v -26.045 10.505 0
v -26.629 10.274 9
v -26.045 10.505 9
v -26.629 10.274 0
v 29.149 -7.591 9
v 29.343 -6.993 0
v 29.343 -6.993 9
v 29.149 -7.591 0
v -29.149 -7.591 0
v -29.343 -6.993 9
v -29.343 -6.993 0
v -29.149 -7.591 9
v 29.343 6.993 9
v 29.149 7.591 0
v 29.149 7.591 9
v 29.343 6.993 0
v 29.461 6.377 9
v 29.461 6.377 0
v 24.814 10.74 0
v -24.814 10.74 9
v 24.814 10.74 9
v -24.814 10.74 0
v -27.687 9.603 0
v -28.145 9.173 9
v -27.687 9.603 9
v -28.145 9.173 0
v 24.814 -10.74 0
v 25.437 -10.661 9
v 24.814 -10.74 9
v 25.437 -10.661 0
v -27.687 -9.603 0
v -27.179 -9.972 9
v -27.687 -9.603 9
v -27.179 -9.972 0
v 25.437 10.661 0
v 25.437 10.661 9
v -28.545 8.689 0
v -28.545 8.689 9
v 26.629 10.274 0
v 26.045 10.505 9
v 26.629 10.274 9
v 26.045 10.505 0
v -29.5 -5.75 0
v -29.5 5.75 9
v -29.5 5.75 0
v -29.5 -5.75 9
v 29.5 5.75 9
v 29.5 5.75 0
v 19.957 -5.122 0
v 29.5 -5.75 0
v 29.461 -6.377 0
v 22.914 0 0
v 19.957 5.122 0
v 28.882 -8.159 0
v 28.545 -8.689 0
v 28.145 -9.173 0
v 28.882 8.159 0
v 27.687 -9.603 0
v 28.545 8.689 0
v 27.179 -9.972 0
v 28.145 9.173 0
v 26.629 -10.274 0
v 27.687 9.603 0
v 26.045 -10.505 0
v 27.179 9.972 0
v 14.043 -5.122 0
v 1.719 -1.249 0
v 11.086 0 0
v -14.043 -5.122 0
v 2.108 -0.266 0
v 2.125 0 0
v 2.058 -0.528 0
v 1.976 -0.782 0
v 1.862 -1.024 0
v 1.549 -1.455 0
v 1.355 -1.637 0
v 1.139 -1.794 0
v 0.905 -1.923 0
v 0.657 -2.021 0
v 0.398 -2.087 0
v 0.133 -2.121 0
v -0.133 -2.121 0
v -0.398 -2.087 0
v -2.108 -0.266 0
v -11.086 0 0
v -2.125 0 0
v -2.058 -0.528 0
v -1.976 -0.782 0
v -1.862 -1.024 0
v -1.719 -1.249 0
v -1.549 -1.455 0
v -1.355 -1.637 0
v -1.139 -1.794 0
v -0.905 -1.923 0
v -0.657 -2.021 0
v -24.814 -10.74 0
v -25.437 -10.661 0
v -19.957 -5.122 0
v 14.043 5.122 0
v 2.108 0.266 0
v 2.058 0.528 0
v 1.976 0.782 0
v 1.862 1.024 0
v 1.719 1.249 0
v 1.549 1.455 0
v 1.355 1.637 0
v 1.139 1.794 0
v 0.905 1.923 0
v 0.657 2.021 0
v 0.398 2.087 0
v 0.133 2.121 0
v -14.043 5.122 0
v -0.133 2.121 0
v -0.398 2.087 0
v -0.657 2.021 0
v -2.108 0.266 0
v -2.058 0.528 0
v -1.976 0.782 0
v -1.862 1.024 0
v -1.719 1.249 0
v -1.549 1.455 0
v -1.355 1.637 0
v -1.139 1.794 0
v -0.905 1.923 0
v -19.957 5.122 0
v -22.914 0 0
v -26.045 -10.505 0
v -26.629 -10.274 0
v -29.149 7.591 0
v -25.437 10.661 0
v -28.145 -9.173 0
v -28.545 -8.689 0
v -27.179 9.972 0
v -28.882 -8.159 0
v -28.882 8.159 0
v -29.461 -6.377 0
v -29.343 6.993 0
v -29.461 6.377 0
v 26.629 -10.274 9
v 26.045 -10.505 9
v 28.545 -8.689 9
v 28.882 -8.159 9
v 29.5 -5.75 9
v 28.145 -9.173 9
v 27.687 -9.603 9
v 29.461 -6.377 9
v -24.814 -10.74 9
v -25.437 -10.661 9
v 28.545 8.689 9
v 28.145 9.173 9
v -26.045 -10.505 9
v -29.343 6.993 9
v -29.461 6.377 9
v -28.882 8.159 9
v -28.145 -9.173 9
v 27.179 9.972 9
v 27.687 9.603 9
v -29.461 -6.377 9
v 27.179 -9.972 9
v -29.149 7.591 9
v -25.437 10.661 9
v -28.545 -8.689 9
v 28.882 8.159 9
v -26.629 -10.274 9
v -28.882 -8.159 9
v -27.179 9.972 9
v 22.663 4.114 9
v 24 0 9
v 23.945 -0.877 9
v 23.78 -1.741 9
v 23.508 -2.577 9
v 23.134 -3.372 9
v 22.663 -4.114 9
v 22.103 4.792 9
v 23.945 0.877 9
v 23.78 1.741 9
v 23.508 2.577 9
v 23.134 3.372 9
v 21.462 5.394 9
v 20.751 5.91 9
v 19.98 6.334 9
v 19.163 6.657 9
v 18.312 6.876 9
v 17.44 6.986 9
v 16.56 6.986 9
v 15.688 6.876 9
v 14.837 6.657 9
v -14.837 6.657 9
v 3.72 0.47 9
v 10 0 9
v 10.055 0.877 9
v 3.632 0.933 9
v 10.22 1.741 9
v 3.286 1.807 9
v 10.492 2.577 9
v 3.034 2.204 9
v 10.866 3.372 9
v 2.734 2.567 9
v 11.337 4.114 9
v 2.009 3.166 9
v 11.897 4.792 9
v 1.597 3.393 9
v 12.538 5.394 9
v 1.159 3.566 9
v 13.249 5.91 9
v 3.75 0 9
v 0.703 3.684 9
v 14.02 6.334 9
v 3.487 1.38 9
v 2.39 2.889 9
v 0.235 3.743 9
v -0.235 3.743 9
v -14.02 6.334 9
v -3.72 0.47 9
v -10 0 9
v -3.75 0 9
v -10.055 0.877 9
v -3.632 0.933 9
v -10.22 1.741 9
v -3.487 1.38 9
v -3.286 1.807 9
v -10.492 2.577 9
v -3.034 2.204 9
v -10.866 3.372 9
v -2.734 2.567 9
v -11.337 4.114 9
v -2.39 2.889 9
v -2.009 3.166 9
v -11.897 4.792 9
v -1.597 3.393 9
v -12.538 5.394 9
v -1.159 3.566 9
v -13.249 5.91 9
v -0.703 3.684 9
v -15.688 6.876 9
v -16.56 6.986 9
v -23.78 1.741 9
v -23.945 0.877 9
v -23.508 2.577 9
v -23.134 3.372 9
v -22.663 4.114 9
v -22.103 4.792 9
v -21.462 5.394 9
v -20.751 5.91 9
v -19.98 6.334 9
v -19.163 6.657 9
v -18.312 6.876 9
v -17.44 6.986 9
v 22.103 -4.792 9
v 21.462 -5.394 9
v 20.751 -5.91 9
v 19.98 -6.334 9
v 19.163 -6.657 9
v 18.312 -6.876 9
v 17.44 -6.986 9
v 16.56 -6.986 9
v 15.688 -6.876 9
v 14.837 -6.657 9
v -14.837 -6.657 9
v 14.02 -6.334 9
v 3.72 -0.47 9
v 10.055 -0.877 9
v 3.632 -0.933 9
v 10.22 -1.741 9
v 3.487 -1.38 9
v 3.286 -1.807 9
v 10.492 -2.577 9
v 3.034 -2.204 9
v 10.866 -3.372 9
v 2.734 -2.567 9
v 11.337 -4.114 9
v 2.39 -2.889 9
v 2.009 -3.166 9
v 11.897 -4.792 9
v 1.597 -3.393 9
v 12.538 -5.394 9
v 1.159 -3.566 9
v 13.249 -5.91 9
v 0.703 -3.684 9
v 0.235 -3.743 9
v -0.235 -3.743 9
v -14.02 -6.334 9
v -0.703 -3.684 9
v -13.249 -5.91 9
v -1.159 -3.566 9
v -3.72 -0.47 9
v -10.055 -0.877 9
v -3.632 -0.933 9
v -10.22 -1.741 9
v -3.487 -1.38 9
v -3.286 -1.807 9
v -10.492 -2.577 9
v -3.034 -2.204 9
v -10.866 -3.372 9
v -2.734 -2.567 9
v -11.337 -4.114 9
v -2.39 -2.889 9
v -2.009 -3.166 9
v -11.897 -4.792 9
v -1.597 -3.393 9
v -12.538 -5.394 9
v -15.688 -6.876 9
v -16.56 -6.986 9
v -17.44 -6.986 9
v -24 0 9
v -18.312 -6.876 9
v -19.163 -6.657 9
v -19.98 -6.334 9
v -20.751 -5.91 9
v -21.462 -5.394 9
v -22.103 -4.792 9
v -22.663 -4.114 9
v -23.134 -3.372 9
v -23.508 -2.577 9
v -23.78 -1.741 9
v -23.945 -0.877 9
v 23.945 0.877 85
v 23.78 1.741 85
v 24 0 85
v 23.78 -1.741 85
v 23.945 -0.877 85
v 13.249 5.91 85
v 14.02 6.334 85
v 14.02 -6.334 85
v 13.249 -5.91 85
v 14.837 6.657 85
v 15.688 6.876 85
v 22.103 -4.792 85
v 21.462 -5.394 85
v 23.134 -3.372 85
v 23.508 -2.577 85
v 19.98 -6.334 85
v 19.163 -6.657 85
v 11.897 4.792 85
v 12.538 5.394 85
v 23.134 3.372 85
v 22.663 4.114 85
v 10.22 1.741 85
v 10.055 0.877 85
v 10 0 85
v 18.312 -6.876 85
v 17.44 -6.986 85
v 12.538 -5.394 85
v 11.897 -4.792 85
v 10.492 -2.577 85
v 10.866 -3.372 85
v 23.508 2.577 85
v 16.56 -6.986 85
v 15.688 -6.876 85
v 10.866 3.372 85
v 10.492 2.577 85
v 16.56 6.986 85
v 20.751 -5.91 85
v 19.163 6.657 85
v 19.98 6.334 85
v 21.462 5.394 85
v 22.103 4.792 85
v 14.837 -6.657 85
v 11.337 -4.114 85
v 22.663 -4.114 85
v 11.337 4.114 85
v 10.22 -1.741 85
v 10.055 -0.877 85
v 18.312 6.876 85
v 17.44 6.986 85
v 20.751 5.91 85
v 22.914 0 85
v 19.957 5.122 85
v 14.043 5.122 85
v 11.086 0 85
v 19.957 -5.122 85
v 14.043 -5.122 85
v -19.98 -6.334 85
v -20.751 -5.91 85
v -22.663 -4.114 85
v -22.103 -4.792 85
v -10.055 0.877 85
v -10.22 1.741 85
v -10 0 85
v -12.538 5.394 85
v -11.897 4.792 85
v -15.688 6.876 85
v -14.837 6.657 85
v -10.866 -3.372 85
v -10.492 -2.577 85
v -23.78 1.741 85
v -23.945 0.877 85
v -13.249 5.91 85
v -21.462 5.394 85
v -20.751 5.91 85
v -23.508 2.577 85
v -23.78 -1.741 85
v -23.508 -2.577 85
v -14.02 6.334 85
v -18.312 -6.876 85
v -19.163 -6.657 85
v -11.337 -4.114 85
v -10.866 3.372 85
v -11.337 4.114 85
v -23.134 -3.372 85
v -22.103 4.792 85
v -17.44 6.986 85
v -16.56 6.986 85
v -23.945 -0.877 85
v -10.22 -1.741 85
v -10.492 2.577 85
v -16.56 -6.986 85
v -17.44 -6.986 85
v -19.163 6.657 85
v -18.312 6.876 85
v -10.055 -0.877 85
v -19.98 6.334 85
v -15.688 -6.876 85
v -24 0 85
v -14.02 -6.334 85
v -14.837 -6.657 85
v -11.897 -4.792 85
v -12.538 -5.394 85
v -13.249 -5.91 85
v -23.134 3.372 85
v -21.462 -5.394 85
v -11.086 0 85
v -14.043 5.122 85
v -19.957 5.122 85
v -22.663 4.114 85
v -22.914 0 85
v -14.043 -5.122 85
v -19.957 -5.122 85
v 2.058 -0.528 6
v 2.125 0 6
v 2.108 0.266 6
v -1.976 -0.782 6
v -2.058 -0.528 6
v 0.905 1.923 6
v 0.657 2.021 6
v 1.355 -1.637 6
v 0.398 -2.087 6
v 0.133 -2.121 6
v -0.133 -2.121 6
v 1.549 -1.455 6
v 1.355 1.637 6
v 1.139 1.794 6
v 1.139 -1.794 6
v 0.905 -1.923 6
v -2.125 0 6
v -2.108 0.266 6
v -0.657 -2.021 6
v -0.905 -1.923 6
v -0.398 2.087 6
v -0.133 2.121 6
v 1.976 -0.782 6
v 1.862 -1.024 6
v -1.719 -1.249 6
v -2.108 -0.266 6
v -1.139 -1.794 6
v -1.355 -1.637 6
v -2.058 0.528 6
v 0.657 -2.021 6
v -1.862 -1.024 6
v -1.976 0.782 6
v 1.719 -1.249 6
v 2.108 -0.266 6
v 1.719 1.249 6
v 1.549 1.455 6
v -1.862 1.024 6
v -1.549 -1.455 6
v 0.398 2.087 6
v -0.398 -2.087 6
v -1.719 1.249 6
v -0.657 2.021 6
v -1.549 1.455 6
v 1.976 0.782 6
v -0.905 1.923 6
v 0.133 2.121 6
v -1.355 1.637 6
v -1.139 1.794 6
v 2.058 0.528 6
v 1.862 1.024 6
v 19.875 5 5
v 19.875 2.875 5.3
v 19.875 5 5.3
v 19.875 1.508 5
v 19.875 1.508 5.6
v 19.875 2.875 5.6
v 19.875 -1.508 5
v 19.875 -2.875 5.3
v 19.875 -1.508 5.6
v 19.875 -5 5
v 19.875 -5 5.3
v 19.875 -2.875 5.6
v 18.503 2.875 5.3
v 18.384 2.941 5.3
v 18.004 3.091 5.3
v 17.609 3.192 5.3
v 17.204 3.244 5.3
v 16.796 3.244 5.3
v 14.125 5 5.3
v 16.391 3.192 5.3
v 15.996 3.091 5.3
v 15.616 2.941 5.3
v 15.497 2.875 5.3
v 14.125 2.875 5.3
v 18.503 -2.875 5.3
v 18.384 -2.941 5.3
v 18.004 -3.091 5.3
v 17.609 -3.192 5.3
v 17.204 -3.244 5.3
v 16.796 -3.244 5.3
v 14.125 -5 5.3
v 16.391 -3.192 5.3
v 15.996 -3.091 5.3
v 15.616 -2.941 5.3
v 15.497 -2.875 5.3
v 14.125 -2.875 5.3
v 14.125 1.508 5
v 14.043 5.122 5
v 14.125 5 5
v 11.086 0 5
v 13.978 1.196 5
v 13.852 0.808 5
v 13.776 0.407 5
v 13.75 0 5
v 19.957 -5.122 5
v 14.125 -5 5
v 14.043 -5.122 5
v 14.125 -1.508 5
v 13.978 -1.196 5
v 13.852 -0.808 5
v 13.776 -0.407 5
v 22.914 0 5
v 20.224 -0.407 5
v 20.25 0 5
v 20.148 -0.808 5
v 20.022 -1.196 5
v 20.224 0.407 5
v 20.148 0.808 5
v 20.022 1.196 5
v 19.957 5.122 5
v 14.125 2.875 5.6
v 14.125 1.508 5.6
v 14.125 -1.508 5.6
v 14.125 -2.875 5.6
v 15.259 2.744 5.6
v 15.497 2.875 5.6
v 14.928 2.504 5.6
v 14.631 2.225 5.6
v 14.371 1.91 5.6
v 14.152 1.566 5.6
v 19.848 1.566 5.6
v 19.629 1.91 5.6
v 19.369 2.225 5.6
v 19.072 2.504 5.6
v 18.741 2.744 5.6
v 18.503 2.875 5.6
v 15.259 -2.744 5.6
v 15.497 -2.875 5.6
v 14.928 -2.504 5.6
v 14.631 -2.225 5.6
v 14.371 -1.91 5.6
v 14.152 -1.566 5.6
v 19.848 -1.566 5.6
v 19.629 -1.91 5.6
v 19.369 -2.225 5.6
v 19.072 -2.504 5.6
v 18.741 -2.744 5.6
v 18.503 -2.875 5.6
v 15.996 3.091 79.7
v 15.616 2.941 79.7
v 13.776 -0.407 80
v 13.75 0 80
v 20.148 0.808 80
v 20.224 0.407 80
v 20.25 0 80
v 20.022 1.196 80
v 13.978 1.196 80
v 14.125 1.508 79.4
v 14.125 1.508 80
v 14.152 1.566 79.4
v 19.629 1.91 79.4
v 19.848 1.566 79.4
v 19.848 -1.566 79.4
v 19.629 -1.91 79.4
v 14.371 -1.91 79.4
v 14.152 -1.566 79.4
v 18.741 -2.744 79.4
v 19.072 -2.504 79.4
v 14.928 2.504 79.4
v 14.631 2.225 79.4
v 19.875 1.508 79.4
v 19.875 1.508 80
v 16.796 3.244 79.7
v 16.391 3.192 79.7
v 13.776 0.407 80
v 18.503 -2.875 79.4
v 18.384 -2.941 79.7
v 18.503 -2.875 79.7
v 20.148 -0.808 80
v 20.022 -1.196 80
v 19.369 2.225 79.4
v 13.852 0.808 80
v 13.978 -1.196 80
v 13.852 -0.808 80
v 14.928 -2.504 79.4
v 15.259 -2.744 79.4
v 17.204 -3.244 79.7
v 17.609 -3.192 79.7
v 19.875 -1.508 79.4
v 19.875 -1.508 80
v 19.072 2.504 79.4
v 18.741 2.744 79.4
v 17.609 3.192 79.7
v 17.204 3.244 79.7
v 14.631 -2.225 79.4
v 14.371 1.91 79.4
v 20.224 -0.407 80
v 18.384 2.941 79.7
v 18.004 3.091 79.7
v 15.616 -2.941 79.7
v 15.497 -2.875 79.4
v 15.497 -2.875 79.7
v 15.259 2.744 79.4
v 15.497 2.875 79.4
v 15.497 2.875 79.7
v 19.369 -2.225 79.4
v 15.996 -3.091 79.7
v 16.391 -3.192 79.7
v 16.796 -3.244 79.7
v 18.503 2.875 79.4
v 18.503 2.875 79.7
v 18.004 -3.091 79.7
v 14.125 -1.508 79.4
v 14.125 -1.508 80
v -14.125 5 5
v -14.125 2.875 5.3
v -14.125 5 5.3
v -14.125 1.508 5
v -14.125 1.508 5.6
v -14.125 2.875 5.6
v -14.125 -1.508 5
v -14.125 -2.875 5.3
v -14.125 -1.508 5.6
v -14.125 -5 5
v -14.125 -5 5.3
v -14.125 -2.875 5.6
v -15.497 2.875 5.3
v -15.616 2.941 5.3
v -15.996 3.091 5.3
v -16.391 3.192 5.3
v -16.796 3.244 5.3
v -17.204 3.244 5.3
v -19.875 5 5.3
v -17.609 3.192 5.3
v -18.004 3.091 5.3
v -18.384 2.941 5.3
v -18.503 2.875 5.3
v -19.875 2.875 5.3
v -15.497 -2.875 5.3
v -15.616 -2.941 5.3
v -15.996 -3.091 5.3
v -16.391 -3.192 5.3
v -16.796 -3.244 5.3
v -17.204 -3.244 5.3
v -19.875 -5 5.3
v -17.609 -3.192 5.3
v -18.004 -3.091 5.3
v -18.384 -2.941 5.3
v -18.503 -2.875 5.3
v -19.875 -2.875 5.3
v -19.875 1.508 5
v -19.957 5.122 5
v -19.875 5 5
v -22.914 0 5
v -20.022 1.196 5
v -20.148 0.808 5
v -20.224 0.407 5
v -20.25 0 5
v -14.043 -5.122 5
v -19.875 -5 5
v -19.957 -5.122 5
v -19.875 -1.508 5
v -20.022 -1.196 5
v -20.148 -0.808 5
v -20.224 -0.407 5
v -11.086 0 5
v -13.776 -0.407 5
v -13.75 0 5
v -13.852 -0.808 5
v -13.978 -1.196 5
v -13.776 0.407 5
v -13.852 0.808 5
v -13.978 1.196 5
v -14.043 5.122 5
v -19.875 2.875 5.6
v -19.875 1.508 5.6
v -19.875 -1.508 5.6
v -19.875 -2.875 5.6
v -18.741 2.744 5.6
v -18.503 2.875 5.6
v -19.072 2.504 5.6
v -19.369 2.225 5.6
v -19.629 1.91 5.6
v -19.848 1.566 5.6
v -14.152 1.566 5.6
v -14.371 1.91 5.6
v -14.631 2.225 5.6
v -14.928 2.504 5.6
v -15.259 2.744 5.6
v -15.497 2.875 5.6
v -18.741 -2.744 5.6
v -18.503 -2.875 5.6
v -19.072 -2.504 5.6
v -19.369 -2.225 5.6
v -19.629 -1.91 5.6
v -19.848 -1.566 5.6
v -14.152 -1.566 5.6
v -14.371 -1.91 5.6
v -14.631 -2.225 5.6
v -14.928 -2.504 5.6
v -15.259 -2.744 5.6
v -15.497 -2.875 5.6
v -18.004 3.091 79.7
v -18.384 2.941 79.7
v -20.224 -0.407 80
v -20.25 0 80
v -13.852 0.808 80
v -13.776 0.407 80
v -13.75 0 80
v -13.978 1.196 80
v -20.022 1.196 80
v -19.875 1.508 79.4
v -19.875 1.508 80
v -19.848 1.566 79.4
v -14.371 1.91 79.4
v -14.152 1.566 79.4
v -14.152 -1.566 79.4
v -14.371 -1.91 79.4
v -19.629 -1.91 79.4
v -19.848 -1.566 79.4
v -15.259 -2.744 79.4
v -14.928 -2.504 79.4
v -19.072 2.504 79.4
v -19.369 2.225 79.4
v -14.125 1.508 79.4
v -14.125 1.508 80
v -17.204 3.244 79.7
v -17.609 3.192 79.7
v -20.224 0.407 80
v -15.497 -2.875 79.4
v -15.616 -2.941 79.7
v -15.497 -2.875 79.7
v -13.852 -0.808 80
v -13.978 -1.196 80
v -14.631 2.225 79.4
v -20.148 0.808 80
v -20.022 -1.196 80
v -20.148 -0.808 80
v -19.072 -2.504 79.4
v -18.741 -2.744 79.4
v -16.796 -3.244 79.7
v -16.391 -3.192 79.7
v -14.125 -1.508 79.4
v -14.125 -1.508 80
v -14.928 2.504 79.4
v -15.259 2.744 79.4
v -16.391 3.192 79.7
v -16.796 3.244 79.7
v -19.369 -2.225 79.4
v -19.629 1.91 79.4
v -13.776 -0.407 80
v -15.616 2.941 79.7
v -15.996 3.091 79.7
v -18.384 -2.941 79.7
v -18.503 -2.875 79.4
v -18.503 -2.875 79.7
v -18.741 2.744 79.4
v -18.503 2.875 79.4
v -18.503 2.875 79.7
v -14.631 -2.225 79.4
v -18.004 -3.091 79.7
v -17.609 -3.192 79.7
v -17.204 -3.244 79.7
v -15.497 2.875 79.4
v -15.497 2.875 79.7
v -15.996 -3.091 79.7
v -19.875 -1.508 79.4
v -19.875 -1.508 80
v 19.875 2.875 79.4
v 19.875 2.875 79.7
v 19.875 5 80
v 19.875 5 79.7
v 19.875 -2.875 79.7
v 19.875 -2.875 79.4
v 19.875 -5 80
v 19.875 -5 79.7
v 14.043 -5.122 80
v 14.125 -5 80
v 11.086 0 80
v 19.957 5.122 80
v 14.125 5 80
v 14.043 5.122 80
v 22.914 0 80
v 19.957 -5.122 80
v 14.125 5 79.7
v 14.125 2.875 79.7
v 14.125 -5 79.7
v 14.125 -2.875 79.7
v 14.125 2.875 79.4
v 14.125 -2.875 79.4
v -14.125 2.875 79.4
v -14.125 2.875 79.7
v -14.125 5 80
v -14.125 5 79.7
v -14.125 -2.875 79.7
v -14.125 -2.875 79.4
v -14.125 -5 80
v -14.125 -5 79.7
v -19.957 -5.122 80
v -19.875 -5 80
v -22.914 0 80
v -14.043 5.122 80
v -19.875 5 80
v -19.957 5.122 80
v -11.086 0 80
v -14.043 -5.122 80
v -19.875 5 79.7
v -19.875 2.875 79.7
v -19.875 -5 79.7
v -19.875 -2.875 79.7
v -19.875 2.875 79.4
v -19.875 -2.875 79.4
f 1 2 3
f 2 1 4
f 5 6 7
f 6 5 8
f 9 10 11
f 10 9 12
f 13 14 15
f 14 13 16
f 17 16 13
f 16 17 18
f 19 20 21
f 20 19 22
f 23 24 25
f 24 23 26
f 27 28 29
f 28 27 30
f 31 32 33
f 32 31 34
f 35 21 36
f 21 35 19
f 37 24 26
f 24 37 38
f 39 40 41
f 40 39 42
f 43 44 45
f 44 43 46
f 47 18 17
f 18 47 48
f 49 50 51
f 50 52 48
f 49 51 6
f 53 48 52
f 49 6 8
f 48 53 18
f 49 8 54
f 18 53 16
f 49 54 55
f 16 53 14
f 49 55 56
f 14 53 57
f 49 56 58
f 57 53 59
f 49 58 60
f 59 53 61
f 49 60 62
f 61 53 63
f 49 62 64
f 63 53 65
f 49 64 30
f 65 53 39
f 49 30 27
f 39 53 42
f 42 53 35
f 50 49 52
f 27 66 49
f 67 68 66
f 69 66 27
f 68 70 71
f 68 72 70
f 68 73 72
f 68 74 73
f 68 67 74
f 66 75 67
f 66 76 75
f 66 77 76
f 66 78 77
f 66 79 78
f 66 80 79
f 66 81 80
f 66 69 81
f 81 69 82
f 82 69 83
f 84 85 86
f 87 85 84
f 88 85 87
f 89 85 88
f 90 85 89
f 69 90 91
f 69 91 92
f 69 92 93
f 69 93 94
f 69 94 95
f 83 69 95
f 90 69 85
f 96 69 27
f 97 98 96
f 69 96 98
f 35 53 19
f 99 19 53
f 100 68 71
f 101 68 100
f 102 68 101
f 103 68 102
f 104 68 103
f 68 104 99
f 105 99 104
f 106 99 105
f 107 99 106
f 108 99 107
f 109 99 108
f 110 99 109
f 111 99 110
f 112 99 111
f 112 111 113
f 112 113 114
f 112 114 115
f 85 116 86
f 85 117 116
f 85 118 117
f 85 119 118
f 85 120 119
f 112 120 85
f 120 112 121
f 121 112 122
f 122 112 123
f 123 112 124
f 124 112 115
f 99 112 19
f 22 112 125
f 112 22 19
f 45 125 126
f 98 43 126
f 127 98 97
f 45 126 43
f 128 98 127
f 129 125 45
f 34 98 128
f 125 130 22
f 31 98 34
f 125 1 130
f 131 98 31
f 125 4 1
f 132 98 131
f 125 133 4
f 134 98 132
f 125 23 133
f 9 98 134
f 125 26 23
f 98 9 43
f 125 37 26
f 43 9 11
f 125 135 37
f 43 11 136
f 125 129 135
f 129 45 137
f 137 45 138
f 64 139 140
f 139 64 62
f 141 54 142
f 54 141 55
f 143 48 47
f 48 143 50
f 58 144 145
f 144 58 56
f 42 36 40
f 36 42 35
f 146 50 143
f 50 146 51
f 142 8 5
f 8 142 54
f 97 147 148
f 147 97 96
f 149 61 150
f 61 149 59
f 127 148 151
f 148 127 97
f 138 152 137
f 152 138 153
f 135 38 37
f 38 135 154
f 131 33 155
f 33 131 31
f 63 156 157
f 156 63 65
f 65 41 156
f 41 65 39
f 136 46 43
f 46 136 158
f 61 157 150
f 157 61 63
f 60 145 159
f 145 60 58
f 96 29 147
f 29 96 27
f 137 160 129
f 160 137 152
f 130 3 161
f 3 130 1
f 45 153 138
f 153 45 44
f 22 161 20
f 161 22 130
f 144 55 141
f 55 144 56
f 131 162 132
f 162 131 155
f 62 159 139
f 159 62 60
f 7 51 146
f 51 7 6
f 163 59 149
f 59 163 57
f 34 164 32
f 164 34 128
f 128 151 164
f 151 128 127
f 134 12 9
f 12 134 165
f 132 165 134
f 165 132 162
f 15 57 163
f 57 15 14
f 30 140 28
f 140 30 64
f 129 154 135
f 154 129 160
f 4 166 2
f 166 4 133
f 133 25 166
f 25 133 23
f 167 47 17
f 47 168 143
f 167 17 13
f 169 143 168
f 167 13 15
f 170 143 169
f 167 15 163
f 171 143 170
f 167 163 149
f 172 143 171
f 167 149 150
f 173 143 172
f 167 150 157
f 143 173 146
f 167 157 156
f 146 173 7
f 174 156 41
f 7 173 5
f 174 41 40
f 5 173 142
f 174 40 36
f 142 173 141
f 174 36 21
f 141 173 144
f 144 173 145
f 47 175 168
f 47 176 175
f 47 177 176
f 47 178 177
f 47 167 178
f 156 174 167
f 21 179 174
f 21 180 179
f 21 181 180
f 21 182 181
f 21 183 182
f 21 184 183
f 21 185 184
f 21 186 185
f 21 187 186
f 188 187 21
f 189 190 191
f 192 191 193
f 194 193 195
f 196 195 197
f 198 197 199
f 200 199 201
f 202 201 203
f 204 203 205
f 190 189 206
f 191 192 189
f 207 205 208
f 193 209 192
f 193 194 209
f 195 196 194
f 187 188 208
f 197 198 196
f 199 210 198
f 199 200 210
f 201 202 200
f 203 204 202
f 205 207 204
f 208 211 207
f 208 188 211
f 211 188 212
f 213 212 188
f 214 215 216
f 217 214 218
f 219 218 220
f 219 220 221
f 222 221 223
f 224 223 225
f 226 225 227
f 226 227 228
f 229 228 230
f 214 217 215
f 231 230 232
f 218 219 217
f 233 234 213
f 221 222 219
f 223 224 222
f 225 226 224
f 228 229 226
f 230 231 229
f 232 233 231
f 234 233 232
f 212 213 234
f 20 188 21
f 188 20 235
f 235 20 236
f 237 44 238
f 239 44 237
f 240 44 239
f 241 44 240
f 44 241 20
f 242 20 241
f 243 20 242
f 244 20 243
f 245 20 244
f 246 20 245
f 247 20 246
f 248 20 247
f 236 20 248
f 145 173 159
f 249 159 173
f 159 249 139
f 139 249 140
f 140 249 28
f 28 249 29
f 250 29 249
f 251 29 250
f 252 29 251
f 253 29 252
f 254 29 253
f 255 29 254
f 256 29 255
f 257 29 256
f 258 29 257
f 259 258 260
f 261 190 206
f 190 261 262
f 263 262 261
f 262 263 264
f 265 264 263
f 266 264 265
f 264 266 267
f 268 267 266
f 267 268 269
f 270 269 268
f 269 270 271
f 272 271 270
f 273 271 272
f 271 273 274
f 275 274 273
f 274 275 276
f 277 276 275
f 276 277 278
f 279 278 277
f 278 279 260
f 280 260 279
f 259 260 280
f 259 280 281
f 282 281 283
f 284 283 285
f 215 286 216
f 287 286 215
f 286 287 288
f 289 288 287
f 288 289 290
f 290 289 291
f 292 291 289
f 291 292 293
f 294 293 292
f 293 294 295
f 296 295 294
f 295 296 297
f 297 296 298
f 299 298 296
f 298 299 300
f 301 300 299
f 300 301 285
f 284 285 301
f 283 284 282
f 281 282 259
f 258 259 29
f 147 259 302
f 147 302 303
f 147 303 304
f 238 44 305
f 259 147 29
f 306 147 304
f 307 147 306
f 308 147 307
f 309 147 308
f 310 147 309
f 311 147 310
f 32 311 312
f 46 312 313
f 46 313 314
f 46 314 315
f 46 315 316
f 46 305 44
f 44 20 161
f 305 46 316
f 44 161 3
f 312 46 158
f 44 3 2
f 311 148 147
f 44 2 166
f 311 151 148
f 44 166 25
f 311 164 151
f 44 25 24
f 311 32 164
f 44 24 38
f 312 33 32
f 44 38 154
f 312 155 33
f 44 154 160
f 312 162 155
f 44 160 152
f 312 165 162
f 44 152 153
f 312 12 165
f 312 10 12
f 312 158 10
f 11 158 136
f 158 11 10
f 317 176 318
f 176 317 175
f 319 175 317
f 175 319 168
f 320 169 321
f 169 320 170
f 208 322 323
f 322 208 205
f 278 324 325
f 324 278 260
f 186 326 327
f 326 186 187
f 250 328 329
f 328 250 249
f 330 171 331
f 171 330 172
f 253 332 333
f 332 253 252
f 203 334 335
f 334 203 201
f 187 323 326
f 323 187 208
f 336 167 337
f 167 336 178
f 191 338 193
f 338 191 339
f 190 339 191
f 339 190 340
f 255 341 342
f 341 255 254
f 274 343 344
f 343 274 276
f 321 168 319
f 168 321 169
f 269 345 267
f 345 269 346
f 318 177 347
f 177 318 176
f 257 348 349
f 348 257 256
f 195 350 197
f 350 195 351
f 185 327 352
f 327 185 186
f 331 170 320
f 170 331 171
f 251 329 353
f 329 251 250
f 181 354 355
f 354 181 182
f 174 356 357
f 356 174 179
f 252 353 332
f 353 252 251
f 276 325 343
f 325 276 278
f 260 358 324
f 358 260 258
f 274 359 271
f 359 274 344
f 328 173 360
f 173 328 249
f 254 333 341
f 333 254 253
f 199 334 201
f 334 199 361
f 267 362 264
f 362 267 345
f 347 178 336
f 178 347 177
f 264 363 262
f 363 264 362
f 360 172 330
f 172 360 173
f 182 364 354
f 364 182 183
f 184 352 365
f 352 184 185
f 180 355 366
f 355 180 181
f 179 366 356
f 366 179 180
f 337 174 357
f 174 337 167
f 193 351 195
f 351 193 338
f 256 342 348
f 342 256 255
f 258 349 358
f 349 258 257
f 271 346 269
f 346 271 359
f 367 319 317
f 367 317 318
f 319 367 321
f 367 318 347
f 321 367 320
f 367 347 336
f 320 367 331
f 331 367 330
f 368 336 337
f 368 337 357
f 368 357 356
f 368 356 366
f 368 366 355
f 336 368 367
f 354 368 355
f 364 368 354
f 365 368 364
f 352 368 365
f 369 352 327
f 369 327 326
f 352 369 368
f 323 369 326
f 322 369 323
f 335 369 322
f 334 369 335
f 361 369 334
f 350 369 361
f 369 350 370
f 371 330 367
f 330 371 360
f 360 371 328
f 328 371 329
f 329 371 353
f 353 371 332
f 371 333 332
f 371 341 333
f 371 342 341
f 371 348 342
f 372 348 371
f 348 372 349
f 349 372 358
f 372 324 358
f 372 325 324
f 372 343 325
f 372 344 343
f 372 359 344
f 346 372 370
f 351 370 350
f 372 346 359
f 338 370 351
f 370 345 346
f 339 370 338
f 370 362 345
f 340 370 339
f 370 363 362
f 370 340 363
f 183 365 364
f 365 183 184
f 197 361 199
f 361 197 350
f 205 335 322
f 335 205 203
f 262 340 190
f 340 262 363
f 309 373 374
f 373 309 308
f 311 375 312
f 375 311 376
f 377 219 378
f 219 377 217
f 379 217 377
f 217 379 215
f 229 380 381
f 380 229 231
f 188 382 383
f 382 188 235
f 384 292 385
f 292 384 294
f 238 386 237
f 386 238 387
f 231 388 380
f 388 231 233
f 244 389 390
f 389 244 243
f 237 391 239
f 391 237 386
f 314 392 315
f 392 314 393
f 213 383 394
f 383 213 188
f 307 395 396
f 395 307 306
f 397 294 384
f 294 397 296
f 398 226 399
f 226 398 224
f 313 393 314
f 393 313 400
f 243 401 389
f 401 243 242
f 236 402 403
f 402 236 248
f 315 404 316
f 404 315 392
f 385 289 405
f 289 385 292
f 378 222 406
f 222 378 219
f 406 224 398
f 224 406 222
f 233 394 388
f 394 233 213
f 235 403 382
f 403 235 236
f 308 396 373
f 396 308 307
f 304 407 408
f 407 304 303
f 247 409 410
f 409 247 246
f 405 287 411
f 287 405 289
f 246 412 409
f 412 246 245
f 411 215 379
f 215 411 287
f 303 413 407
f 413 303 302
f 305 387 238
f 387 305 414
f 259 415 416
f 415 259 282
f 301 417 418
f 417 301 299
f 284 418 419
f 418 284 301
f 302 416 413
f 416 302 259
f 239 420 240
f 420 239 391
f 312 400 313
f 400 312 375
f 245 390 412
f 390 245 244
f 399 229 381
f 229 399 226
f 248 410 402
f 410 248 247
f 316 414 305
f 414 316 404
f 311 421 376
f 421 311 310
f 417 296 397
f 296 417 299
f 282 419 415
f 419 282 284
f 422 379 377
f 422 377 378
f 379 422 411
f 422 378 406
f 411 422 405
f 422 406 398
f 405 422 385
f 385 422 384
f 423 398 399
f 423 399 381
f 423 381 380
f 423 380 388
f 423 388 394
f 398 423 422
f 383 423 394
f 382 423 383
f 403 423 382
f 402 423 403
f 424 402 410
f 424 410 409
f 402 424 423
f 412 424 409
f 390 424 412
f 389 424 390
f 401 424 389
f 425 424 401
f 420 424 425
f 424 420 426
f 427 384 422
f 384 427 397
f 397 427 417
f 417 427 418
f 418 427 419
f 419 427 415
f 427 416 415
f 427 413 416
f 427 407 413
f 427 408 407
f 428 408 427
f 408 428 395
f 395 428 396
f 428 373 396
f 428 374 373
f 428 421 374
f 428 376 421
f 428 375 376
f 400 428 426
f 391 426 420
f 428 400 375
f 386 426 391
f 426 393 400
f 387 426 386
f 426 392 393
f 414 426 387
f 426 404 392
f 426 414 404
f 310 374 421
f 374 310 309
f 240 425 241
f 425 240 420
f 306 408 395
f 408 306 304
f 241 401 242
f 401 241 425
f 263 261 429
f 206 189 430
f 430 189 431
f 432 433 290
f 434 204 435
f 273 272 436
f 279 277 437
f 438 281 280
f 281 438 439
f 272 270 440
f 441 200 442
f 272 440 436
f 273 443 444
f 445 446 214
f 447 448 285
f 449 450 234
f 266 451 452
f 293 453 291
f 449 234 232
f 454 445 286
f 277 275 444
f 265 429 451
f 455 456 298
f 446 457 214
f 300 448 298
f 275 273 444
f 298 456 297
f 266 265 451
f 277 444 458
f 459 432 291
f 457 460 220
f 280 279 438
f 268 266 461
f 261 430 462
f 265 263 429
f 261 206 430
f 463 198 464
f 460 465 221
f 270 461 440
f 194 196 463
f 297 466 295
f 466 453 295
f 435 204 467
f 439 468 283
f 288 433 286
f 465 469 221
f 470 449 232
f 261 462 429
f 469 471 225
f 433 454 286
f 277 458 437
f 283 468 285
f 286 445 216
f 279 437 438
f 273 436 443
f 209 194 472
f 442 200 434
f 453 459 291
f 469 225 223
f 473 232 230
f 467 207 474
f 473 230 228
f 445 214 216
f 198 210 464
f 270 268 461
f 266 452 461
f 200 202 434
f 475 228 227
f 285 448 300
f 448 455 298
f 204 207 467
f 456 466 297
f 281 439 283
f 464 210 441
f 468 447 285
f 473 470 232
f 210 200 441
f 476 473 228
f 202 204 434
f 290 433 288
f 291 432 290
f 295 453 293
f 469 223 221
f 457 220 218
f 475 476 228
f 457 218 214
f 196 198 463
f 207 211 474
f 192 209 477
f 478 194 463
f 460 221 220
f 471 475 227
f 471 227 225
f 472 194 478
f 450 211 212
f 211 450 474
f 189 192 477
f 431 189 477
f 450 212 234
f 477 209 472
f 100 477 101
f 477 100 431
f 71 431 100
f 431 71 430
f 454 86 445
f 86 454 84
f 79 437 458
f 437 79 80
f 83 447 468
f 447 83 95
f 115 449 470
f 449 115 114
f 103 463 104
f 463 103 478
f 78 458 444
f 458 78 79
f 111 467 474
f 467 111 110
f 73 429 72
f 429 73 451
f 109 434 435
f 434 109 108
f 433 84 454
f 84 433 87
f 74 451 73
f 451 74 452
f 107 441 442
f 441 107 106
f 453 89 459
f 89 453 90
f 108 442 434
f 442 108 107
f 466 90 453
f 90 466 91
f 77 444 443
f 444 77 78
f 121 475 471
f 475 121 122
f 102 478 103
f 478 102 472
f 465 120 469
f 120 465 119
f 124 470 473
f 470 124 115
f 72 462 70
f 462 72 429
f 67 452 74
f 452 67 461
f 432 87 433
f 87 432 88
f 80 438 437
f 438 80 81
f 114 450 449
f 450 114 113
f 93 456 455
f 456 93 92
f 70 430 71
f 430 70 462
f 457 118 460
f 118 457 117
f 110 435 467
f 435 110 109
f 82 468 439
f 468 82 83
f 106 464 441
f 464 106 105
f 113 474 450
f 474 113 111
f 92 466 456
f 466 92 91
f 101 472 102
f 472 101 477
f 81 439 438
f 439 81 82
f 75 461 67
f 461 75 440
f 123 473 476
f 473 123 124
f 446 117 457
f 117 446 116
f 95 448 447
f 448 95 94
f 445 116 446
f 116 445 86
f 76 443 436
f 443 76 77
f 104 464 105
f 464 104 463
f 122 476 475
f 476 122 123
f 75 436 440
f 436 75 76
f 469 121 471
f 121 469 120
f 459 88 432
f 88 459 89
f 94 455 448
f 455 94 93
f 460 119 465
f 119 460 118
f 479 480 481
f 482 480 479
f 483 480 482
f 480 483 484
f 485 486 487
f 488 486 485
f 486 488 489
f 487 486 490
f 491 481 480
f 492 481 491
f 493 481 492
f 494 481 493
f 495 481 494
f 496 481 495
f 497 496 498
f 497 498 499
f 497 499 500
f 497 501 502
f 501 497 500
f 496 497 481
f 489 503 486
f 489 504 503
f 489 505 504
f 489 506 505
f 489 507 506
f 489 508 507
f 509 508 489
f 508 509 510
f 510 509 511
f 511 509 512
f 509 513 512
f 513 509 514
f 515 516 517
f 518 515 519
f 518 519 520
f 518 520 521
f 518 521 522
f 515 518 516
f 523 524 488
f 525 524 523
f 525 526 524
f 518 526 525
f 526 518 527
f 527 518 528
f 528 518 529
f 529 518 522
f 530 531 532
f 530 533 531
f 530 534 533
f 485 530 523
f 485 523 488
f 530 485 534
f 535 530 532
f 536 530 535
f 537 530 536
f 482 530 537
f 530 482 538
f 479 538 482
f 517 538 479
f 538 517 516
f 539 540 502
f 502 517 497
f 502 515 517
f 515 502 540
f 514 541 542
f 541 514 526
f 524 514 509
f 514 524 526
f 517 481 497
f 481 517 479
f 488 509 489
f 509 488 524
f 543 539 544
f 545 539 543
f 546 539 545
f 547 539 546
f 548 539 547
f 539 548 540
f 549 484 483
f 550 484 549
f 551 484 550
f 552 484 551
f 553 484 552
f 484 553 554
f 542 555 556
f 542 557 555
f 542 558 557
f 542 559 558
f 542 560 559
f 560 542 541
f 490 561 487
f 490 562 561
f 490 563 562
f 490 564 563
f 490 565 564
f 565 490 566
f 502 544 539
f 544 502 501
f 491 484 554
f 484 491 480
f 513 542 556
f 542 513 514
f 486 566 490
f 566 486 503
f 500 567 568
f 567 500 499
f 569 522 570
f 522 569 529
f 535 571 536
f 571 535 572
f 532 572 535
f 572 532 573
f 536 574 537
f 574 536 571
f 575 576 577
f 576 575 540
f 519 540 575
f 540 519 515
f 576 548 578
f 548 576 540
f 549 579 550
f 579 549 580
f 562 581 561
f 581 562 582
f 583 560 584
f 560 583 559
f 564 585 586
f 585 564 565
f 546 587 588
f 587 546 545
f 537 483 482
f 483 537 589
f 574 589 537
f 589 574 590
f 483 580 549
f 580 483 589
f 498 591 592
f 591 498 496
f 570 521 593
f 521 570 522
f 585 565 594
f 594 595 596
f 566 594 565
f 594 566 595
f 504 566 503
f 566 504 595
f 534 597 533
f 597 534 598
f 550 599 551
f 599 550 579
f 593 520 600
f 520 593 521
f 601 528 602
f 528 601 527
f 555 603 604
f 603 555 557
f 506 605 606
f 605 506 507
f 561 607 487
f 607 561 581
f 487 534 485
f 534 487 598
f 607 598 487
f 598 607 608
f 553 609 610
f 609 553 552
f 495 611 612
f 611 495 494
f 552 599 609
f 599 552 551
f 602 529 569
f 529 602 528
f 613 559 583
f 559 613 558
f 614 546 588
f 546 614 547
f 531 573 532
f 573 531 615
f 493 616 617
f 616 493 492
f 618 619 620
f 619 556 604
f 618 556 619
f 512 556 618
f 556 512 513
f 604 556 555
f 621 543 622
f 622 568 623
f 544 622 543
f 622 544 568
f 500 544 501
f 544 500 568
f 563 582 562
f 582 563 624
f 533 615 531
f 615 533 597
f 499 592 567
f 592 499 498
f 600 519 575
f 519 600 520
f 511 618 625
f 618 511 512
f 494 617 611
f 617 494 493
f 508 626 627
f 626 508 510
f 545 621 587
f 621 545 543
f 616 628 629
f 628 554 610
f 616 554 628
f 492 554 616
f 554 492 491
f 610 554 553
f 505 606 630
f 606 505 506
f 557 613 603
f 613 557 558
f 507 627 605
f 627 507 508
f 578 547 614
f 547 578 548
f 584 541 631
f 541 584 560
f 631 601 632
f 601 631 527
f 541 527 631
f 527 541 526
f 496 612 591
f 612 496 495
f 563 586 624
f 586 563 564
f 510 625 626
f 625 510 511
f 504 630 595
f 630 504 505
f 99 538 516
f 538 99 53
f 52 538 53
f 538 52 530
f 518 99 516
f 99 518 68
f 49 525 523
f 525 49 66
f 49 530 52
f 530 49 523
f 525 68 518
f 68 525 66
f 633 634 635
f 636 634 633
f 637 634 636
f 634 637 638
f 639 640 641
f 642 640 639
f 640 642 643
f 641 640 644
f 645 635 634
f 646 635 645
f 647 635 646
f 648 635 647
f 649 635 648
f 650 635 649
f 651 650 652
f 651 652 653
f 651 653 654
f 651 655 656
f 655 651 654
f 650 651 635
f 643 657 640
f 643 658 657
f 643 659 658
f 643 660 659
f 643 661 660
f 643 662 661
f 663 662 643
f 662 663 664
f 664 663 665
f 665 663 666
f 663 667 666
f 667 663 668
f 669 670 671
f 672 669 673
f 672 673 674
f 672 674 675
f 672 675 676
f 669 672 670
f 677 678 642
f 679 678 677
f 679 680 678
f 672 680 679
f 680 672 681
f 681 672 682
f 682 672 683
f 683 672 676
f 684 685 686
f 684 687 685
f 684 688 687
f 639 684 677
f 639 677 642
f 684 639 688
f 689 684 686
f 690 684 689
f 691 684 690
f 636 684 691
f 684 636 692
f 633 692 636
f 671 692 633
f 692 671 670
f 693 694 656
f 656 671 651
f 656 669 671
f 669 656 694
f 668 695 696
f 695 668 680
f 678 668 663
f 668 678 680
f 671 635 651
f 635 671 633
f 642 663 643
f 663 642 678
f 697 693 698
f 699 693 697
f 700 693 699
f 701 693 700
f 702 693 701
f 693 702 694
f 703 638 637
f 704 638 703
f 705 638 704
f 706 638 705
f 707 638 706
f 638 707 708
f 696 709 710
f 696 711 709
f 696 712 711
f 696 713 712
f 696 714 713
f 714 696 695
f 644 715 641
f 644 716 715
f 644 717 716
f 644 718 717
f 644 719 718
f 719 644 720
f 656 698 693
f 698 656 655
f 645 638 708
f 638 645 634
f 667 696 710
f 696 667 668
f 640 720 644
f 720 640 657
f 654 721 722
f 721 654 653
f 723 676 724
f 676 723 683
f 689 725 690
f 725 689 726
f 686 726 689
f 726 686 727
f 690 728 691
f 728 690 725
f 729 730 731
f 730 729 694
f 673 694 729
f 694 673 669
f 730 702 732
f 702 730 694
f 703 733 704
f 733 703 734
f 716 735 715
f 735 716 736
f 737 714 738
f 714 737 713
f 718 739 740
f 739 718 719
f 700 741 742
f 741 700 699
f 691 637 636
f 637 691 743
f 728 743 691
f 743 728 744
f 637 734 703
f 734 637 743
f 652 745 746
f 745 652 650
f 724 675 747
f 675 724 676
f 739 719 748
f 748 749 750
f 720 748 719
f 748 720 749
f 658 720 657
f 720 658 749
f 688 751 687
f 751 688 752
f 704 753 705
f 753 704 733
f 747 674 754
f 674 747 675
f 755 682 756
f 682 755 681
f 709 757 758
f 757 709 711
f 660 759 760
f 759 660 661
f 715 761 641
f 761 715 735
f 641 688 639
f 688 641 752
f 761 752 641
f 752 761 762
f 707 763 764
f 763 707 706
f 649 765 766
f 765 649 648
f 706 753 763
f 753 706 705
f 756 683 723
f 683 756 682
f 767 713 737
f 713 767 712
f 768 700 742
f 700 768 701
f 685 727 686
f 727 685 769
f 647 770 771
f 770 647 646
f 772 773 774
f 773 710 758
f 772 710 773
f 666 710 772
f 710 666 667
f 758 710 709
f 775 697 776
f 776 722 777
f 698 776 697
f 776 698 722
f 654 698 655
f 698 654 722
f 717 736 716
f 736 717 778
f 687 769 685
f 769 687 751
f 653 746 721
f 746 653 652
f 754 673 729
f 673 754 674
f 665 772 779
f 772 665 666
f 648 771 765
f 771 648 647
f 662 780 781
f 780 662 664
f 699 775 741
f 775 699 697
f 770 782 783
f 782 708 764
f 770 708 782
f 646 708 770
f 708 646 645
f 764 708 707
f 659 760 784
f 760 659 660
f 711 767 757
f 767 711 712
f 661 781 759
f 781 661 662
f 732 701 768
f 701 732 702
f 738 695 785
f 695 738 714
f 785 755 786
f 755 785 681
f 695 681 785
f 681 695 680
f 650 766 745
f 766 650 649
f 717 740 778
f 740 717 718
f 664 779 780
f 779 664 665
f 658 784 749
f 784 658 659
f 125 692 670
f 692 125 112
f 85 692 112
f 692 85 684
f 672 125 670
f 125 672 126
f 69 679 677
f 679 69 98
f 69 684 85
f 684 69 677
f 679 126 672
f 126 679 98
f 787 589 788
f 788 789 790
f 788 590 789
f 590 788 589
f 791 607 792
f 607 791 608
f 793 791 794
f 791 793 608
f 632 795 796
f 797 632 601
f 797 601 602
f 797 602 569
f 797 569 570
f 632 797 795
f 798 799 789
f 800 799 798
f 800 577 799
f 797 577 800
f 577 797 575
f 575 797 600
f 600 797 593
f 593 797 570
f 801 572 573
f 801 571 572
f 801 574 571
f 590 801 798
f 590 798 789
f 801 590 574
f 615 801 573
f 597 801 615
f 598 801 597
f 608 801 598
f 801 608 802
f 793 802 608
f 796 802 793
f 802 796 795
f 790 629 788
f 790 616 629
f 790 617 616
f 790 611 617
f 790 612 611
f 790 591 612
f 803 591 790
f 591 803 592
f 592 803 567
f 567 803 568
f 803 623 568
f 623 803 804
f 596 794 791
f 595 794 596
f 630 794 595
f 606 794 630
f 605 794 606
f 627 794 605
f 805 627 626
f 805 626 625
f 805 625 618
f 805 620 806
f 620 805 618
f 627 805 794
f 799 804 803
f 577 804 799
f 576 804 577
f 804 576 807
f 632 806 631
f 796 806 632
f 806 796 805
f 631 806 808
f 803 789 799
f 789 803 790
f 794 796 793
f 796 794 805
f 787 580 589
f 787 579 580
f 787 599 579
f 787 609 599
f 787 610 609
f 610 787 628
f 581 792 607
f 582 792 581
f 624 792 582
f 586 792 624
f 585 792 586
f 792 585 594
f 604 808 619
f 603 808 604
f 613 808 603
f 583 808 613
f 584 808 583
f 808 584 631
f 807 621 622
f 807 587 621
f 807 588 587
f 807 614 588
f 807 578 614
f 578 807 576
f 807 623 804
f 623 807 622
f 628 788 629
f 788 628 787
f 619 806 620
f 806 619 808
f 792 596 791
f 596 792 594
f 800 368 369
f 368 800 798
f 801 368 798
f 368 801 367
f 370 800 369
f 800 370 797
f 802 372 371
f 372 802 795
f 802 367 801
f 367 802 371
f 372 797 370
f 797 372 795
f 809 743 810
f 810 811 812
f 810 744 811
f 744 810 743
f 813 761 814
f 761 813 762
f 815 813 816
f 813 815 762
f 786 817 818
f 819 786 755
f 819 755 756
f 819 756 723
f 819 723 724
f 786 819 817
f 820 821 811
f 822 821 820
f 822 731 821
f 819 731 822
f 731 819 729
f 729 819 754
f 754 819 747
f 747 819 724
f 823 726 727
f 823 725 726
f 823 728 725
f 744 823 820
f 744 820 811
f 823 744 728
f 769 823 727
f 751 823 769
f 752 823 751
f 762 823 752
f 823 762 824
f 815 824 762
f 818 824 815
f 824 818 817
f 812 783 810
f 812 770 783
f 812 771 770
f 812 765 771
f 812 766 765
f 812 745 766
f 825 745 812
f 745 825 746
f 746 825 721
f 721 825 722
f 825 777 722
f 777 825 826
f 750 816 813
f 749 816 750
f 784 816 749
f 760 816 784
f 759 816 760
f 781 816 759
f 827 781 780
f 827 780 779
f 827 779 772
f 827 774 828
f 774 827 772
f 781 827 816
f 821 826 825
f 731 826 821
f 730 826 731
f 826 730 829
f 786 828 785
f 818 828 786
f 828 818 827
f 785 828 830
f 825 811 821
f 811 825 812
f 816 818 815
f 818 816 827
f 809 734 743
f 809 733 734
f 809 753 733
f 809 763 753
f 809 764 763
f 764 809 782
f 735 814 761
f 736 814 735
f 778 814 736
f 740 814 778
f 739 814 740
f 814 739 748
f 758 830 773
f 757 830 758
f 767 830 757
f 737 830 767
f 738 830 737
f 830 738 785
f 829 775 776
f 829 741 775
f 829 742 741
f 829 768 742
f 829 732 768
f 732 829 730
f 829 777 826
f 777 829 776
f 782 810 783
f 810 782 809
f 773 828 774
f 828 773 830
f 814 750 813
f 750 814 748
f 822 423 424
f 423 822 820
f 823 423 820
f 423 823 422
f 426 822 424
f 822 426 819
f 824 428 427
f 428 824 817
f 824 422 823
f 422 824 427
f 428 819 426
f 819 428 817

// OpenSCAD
$fn = 50;


difference() {
	union() {
		hull() {
			translate(v = [-24.5000000000, 5.7500000000, 0]) {
				cylinder(h = 9, r = 5);
			}
			translate(v = [24.5000000000, 5.7500000000, 0]) {
				cylinder(h = 9, r = 5);
			}
			translate(v = [-24.5000000000, -5.7500000000, 0]) {
				cylinder(h = 9, r = 5);
			}
			translate(v = [24.5000000000, -5.7500000000, 0]) {
				cylinder(h = 9, r = 5);
			}
		}
		translate(v = [17.0000000000, 0, 0.0000000000]) {
			cylinder(h = 85, r = 7.0000000000);
		}
		translate(v = [-17.0000000000, 0, 0.0000000000]) {
			cylinder(h = 85, r = 7.0000000000);
		}
		translate(v = [17.0000000000, 0, 79.0000000000]) {
			cylinder(h = 6, r = 7.0000000000);
		}
		translate(v = [-17.0000000000, 0, 79.0000000000]) {
			cylinder(h = 6, r = 7.0000000000);
		}
	}
	union() {
		translate(v = [0, 0, 9]) {
			rotate(a = [0, 0, 0]) {
				difference() {
					union() {
						#translate(v = [0, 0, -80.0000000000]) {
							cylinder(h = 80, r = 2.0000000000);
						}
						#translate(v = [0, 0, -3]) {
							cylinder(h = 3, r1 = 2.1250000000, r2 = 3.7500000000);
						}
						#translate(v = [0, 0, -80.0000000000]) {
							cylinder(h = 80, r = 2.1250000000);
						}
						#translate(v = [0, 0, -80.0000000000]) {
							cylinder(h = 80, r = 2.0000000000);
						}
					}
					union();
				}
			}
		}
		translate(v = [17.0000000000, 0, 0]) {
			rotate(a = [0, 0, 0]) {
				difference() {
					union() {
						#translate(v = [-2.8750000000, -5.0000000000, -0.3000000000]) {
							cube(size = [5.7500000000, 10, 0.3000000000]);
						}
						#translate(v = [-2.8750000000, -2.8750000000, -0.6000000000]) {
							cube(size = [5.7500000000, 5.7500000000, 0.3000000000]);
						}
						#translate(v = [-2.8750000000, -5.0000000000, 5]) {
							cube(size = [5.7500000000, 10, 0.3000000000]);
						}
						#translate(v = [-2.8750000000, -2.8750000000, 5.3000000000]) {
							cube(size = [5.7500000000, 5.7500000000, 0.3000000000]);
						}
						#translate(v = [0, 0, -100.0000000000]) {
							cylinder(h = 200, r = 3.2500000000);
						}
						#linear_extrude(height = 5) {
							polygon(points = [[5.9142500000, 0.0000000000], [2.9571250000, 5.1218907443], [-2.9571250000, 5.1218907443], [-5.9142500000, 0.0000000000], [-2.9571250000, -5.1218907443], [2.9571250000, -5.1218907443]]);
						}
						#translate(v = [-2.8750000000, -5.0000000000, -0.3000000000]) {
							cube(size = [5.7500000000, 10, 0.3000000000]);
						}
						#translate(v = [-2.8750000000, -2.8750000000, -0.6000000000]) {
							cube(size = [5.7500000000, 5.7500000000, 0.3000000000]);
						}
						#translate(v = [-2.8750000000, -5.0000000000, 5]) {
							cube(size = [5.7500000000, 10, 0.3000000000]);
						}
						#translate(v = [-2.8750000000, -2.8750000000, 5.3000000000]) {
							cube(size = [5.7500000000, 5.7500000000, 0.3000000000]);
						}
						#translate(v = [0, 0, -100.0000000000]) {
							cylinder(h = 200, r = 3.2500000000);
						}
						#translate(v = [-2.8750000000, -5.0000000000, -0.3000000000]) {
							cube(size = [5.7500000000, 10, 0.3000000000]);
						}
						#translate(v = [-2.8750000000, -2.8750000000, -0.6000000000]) {
							cube(size = [5.7500000000, 5.7500000000, 0.3000000000]);
						}
						#translate(v = [-2.8750000000, -5.0000000000, 5]) {
							cube(size = [5.7500000000, 10, 0.3000000000]);
						}
						#translate(v = [-2.8750000000, -2.8750000000, 5.3000000000]) {
							cube(size = [5.7500000000, 5.7500000000, 0.3000000000]);
						}
						#translate(v = [0, 0, -100.0000000000]) {
							cylinder(h = 200, r = 3.2500000000);
						}
					}
					union();
				}
			}
		}
		translate(v = [-17.0000000000, 0, 0]) {
			rotate(a = [0, 0, 0]) {
				difference() {
					union() {
						#translate(v = [-2.8750000000, -5.0000000000, -0.3000000000]) {
							cube(size = [5.7500000000, 10, 0.3000000000]);
						}
						#translate(v = [-2.8750000000, -2.8750000000, -0.6000000000]) {
							cube(size = [5.7500000000, 5.7500000000, 0.3000000000]);
						}
						#translate(v = [-2.8750000000, -5.0000000000, 5]) {
							cube(size = [5.7500000000, 10, 0.3000000000]);
						}
						#translate(v = [-2.8750000000, -2.8750000000, 5.3000000000]) {
							cube(size = [5.7500000000, 5.7500000000, 0.3000000000]);
						}
						#translate(v = [0, 0, -100.0000000000]) {
							cylinder(h = 200, r = 3.2500000000);
						}
						#linear_extrude(height = 5) {
							polygon(points = [[5.9142500000, 0.0000000000], [2.9571250000, 5.1218907443], [-2.9571250000, 5.1218907443], [-5.9142500000, 0.0000000000], [-2.9571250000, -5.1218907443], [2.9571250000, -5.1218907443]]);
						}
						#translate(v = [-2.8750000000, -5.0000000000, -0.3000000000]) {
							cube(size = [5.7500000000, 10, 0.3000000000]);
						}
						#translate(v = [-2.8750000000, -2.8750000000, -0.6000000000]) {
							cube(size = [5.7500000000, 5.7500000000, 0.3000000000]);
						}
						#translate(v = [-2.8750000000, -5.0000000000, 5]) {
							cube(size = [5.7500000000, 10, 0.3000000000]);
						}
						#translate(v = [-2.8750000000, -2.8750000000, 5.3000000000]) {
							cube(size = [5.7500000000, 5.7500000000, 0.3000000000]);
						}
						#translate(v = [0, 0, -100.0000000000]) {
							cylinder(h = 200, r = 3.2500000000);
						}
						#translate(v = [-2.8750000000, -5.0000000000, -0.3000000000]) {
							cube(size = [5.7500000000, 10, 0.3000000000]);
						}
						#translate(v = [-2.8750000000, -2.8750000000, -0.6000000000]) {
							cube(size = [5.7500000000, 5.7500000000, 0.3000000000]);
						}
						#translate(v = [-2.8750000000, -5.0000000000, 5]) {
							cube(size = [5.7500000000, 10, 0.3000000000]);
						}
						#translate(v = [-2.8750000000, -2.8750000000, 5.3000000000]) {
							cube(size = [5.7500000000, 5.7500000000, 0.3000000000]);
						}
						#translate(v = [0, 0, -100.0000000000]) {
							cylinder(h = 200, r = 3.2500000000);
						}
					}
					union();
				}
			}
		}
		translate(v = [17.0000000000, 0, 85]) {
			rotate(a = [0, 0, 0]) {
				difference() {
					union() {
						#translate(v = [-2.8750000000, -5.0000000000, -5.3000000000]) {
							cube(size = [5.7500000000, 10, 0.3000000000]);
						}
						#translate(v = [-2.8750000000, -2.8750000000, -5.6000000000]) {
							cube(size = [5.7500000000, 5.7500000000, 0.3000000000]);
						}
						#translate(v = [-2.8750000000, -5.0000000000, 0]) {
							cube(size = [5.7500000000, 10, 0.3000000000]);
						}
						#translate(v = [-2.8750000000, -2.8750000000, 0.3000000000]) {
							cube(size = [5.7500000000, 5.7500000000, 0.3000000000]);
						}
						#translate(v = [0, 0, -100.0000000000]) {
							cylinder(h = 200, r = 3.2500000000);
						}
						translate(v = [0, 0, -5]) {
							#linear_extrude(height = 5) {
								polygon(points = [[5.9142500000, 0.0000000000], [2.9571250000, 5.1218907443], [-2.9571250000, 5.1218907443], [-5.9142500000, 0.0000000000], [-2.9571250000, -5.1218907443], [2.9571250000, -5.1218907443]]);
							}
						}
						#translate(v = [-2.8750000000, -5.0000000000, -5.3000000000]) {
							cube(size = [5.7500000000, 10, 0.3000000000]);
						}
						#translate(v = [-2.8750000000, -2.8750000000, -5.6000000000]) {
							cube(size = [5.7500000000, 5.7500000000, 0.3000000000]);
						}
						#translate(v = [-2.8750000000, -5.0000000000, 0]) {
							cube(size = [5.7500000000, 10, 0.3000000000]);
						}
						#translate(v = [-2.8750000000, -2.8750000000, 0.3000000000]) {
							cube(size = [5.7500000000, 5.7500000000, 0.3000000000]);
						}
						#translate(v = [0, 0, -100.0000000000]) {
							cylinder(h = 200, r = 3.2500000000);
						}
						#translate(v = [-2.8750000000, -5.0000000000, -5.3000000000]) {
							cube(size = [5.7500000000, 10, 0.3000000000]);
						}
						#translate(v = [-2.8750000000, -2.8750000000, -5.6000000000]) {
							cube(size = [5.7500000000, 5.7500000000, 0.3000000000]);
						}
						#translate(v = [-2.8750000000, -5.0000000000, 0]) {
							cube(size = [5.7500000000, 10, 0.3000000000]);
						}
						#translate(v = [-2.8750000000, -2.8750000000, 0.3000000000]) {
							cube(size = [5.7500000000, 5.7500000000, 0.3000000000]);
						}
						#translate(v = [0, 0, -100.0000000000]) {
							cylinder(h = 200, r = 3.2500000000);
						}
					}
					union();
				}
			}
		}
		translate(v = [-17.0000000000, 0, 85]) {
			rotate(a = [0, 0, 0]) {
				difference() {
					union() {
						#translate(v = [-2.8750000000, -5.0000000000, -5.3000000000]) {
							cube(size = [5.7500000000, 10, 0.3000000000]);
						}
						#translate(v = [-2.8750000000, -2.8750000000, -5.6000000000]) {
							cube(size = [5.7500000000, 5.7500000000, 0.3000000000]);
						}
						#translate(v = [-2.8750000000, -5.0000000000, 0]) {
							cube(size = [5.7500000000, 10, 0.3000000000]);
						}
						#translate(v = [-2.8750000000, -2.8750000000, 0.3000000000]) {
							cube(size = [5.7500000000, 5.7500000000, 0.3000000000]);
						}
						#translate(v = [0, 0, -100.0000000000]) {
							cylinder(h = 200, r = 3.2500000000);
						}
						translate(v = [0, 0, -5]) {
							#linear_extrude(height = 5) {
								polygon(points = [[5.9142500000, 0.0000000000], [2.9571250000, 5.1218907443], [-2.9571250000, 5.1218907443], [-5.9142500000, 0.0000000000], [-2.9571250000, -5.1218907443], [2.9571250000, -5.1218907443]]);
							}
						}
						#translate(v = [-2.8750000000, -5.0000000000, -5.3000000000]) {
							cube(size = [5.7500000000, 10, 0.3000000000]);
						}
						#translate(v = [-2.8750000000, -2.8750000000, -5.6000000000]) {
							cube(size = [5.7500000000, 5.7500000000, 0.3000000000]);
						}
						#translate(v = [-2.8750000000, -5.0000000000, 0]) {
							cube(size = [5.7500000000, 10, 0.3000000000]);
						}
						#translate(v = [-2.8750000000, -2.8750000000, 0.3000000000]) {
							cube(size = [5.7500000000, 5.7500000000, 0.3000000000]);
						}
						#translate(v = [0, 0, -100.0000000000]) {
							cylinder(h = 200, r = 3.2500000000);
						}
						#translate(v = [-2.8750000000, -5.0000000000, -5.3000000000]) {
							cube(size = [5.7500000000, 10, 0.3000000000]);
						}
						#translate(v = [-2.8750000000, -2.8750000000, -5.6000000000]) {
							cube(size = [5.7500000000, 5.7500000000, 0.3000000000]);
						}
						#translate(v = [-2.8750000000, -5.0000000000, 0]) {
							cube(size = [5.7500000000, 10, 0.3000000000]);
						}
						#translate(v = [-2.8750000000, -2.8750000000, 0.3000000000]) {
							cube(size = [5.7500000000, 5.7500000000, 0.3000000000]);
						}
						#translate(v = [0, 0, -100.0000000000]) {
							cylinder(h = 200, r = 3.2500000000);
						}
					}
					union();
				}
			}
		}
	}
}
